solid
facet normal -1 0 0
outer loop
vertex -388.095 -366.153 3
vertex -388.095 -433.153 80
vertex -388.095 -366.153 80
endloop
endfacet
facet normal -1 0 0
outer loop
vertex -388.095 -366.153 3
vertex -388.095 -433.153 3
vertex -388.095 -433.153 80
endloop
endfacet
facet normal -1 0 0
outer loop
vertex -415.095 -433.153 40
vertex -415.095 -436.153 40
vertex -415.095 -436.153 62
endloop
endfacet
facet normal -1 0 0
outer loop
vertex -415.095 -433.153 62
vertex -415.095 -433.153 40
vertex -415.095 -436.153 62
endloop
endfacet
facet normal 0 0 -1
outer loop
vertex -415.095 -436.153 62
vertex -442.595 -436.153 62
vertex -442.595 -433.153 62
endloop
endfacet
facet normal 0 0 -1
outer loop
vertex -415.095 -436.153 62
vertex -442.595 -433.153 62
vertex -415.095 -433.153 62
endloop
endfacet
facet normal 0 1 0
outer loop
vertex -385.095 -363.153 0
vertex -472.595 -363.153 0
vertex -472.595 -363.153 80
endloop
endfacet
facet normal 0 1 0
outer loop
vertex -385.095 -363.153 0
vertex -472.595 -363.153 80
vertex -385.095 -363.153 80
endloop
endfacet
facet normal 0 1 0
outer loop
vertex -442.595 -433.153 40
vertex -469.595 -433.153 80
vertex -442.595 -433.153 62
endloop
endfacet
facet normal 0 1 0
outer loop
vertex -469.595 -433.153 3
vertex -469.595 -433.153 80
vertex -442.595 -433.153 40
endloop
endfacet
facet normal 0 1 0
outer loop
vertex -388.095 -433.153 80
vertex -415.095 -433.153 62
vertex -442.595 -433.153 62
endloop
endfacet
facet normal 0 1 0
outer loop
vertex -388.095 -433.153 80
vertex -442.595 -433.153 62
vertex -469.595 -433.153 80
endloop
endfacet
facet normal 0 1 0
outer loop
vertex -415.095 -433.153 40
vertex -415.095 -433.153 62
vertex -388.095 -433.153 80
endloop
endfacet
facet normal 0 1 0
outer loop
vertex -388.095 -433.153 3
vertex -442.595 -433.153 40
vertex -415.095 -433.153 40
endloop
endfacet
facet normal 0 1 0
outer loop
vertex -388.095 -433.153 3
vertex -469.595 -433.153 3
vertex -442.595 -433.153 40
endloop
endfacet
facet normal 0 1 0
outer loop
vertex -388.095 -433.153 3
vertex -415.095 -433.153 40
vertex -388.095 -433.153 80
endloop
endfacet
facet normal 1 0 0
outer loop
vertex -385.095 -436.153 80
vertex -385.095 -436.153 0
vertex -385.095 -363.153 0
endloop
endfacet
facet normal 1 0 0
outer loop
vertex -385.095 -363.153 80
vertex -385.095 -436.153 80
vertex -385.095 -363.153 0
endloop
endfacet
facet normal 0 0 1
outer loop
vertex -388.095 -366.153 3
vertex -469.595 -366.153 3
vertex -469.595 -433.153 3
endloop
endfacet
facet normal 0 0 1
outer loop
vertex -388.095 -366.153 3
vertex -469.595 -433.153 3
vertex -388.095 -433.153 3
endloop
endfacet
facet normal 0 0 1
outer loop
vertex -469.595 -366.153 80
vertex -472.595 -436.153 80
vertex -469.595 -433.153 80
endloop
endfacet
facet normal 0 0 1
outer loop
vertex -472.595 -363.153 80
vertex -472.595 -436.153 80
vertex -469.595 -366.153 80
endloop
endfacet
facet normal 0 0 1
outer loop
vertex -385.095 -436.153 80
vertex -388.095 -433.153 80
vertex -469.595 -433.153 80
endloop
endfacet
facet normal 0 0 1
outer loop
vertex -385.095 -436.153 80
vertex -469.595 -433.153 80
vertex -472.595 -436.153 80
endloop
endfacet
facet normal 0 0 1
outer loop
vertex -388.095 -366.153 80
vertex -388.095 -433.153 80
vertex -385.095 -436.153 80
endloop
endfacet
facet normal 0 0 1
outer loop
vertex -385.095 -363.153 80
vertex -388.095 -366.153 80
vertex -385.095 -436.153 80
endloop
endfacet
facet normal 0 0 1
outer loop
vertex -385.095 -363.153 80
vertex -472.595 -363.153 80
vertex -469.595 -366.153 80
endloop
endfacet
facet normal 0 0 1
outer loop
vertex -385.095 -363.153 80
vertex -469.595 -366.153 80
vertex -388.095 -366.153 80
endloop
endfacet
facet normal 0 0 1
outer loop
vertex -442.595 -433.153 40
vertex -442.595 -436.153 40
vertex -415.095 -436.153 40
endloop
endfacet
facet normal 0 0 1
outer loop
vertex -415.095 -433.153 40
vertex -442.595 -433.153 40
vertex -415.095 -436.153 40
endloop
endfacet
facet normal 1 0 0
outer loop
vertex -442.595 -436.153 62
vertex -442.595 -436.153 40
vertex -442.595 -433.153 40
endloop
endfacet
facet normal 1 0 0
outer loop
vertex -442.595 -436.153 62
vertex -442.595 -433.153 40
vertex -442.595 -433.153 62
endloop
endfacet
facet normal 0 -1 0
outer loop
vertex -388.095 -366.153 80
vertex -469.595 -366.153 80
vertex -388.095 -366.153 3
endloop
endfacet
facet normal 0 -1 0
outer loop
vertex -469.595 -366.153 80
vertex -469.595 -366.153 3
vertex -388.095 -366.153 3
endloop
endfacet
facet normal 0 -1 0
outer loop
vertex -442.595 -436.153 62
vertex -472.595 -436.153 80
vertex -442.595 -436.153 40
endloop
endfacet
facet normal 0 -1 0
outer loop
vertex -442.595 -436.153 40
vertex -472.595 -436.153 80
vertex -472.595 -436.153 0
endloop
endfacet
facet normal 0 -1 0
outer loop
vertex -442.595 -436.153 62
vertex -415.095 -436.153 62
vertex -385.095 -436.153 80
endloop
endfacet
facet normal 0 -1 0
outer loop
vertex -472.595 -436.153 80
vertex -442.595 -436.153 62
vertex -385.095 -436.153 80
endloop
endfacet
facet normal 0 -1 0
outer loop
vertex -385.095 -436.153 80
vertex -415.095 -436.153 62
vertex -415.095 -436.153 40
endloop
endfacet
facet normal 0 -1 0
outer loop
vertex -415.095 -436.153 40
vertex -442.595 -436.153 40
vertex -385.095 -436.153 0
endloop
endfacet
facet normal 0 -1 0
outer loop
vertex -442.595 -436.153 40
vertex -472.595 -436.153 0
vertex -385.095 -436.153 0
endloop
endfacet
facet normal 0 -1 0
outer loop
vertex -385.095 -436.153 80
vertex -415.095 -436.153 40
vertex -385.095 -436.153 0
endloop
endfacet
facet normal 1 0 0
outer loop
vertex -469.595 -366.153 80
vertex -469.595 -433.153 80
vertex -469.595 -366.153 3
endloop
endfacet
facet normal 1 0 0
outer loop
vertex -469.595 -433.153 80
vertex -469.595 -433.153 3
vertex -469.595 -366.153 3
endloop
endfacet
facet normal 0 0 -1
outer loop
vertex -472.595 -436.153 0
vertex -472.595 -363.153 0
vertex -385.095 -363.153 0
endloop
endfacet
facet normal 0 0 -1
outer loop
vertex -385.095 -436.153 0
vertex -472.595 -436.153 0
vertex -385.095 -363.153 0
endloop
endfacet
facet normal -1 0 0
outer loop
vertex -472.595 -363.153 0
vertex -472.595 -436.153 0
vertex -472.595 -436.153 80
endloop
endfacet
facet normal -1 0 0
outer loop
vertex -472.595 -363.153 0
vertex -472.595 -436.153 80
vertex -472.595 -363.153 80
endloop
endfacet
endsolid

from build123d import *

# Parameters (mm, degrees)
F0_W     = 87.5
F0_H     = 73
F1_DEPTH = 80
F2_T     = -3
F3_W     = 27.5
F3_H     = 22
F4_DEPTH = 3.1


with BuildPart() as f1:
    # F0 (on Top) → F1 (new body)
    with BuildSketch(Plane.XY):
        with Locations((-428.844619, -399.653114)):
            Rectangle(F0_W, F0_H)
    extrude(amount=F1_DEPTH)

    # F2
    f2_openings = [f1.faces().sort_by_distance(p)[0] for p in [
        (-428.844619, -399.653114, 80),
    ]]
    offset(amount=F2_T, openings=f2_openings)

    # F3 (on face) → F4 (cut)
    with BuildSketch(Plane.XZ.offset(436.153114)):
        with Locations((-428.844619, 51)):
            Rectangle(F3_W, F3_H)
    extrude(amount=-F4_DEPTH, mode=Mode.SUBTRACT)


solid = f1.part
